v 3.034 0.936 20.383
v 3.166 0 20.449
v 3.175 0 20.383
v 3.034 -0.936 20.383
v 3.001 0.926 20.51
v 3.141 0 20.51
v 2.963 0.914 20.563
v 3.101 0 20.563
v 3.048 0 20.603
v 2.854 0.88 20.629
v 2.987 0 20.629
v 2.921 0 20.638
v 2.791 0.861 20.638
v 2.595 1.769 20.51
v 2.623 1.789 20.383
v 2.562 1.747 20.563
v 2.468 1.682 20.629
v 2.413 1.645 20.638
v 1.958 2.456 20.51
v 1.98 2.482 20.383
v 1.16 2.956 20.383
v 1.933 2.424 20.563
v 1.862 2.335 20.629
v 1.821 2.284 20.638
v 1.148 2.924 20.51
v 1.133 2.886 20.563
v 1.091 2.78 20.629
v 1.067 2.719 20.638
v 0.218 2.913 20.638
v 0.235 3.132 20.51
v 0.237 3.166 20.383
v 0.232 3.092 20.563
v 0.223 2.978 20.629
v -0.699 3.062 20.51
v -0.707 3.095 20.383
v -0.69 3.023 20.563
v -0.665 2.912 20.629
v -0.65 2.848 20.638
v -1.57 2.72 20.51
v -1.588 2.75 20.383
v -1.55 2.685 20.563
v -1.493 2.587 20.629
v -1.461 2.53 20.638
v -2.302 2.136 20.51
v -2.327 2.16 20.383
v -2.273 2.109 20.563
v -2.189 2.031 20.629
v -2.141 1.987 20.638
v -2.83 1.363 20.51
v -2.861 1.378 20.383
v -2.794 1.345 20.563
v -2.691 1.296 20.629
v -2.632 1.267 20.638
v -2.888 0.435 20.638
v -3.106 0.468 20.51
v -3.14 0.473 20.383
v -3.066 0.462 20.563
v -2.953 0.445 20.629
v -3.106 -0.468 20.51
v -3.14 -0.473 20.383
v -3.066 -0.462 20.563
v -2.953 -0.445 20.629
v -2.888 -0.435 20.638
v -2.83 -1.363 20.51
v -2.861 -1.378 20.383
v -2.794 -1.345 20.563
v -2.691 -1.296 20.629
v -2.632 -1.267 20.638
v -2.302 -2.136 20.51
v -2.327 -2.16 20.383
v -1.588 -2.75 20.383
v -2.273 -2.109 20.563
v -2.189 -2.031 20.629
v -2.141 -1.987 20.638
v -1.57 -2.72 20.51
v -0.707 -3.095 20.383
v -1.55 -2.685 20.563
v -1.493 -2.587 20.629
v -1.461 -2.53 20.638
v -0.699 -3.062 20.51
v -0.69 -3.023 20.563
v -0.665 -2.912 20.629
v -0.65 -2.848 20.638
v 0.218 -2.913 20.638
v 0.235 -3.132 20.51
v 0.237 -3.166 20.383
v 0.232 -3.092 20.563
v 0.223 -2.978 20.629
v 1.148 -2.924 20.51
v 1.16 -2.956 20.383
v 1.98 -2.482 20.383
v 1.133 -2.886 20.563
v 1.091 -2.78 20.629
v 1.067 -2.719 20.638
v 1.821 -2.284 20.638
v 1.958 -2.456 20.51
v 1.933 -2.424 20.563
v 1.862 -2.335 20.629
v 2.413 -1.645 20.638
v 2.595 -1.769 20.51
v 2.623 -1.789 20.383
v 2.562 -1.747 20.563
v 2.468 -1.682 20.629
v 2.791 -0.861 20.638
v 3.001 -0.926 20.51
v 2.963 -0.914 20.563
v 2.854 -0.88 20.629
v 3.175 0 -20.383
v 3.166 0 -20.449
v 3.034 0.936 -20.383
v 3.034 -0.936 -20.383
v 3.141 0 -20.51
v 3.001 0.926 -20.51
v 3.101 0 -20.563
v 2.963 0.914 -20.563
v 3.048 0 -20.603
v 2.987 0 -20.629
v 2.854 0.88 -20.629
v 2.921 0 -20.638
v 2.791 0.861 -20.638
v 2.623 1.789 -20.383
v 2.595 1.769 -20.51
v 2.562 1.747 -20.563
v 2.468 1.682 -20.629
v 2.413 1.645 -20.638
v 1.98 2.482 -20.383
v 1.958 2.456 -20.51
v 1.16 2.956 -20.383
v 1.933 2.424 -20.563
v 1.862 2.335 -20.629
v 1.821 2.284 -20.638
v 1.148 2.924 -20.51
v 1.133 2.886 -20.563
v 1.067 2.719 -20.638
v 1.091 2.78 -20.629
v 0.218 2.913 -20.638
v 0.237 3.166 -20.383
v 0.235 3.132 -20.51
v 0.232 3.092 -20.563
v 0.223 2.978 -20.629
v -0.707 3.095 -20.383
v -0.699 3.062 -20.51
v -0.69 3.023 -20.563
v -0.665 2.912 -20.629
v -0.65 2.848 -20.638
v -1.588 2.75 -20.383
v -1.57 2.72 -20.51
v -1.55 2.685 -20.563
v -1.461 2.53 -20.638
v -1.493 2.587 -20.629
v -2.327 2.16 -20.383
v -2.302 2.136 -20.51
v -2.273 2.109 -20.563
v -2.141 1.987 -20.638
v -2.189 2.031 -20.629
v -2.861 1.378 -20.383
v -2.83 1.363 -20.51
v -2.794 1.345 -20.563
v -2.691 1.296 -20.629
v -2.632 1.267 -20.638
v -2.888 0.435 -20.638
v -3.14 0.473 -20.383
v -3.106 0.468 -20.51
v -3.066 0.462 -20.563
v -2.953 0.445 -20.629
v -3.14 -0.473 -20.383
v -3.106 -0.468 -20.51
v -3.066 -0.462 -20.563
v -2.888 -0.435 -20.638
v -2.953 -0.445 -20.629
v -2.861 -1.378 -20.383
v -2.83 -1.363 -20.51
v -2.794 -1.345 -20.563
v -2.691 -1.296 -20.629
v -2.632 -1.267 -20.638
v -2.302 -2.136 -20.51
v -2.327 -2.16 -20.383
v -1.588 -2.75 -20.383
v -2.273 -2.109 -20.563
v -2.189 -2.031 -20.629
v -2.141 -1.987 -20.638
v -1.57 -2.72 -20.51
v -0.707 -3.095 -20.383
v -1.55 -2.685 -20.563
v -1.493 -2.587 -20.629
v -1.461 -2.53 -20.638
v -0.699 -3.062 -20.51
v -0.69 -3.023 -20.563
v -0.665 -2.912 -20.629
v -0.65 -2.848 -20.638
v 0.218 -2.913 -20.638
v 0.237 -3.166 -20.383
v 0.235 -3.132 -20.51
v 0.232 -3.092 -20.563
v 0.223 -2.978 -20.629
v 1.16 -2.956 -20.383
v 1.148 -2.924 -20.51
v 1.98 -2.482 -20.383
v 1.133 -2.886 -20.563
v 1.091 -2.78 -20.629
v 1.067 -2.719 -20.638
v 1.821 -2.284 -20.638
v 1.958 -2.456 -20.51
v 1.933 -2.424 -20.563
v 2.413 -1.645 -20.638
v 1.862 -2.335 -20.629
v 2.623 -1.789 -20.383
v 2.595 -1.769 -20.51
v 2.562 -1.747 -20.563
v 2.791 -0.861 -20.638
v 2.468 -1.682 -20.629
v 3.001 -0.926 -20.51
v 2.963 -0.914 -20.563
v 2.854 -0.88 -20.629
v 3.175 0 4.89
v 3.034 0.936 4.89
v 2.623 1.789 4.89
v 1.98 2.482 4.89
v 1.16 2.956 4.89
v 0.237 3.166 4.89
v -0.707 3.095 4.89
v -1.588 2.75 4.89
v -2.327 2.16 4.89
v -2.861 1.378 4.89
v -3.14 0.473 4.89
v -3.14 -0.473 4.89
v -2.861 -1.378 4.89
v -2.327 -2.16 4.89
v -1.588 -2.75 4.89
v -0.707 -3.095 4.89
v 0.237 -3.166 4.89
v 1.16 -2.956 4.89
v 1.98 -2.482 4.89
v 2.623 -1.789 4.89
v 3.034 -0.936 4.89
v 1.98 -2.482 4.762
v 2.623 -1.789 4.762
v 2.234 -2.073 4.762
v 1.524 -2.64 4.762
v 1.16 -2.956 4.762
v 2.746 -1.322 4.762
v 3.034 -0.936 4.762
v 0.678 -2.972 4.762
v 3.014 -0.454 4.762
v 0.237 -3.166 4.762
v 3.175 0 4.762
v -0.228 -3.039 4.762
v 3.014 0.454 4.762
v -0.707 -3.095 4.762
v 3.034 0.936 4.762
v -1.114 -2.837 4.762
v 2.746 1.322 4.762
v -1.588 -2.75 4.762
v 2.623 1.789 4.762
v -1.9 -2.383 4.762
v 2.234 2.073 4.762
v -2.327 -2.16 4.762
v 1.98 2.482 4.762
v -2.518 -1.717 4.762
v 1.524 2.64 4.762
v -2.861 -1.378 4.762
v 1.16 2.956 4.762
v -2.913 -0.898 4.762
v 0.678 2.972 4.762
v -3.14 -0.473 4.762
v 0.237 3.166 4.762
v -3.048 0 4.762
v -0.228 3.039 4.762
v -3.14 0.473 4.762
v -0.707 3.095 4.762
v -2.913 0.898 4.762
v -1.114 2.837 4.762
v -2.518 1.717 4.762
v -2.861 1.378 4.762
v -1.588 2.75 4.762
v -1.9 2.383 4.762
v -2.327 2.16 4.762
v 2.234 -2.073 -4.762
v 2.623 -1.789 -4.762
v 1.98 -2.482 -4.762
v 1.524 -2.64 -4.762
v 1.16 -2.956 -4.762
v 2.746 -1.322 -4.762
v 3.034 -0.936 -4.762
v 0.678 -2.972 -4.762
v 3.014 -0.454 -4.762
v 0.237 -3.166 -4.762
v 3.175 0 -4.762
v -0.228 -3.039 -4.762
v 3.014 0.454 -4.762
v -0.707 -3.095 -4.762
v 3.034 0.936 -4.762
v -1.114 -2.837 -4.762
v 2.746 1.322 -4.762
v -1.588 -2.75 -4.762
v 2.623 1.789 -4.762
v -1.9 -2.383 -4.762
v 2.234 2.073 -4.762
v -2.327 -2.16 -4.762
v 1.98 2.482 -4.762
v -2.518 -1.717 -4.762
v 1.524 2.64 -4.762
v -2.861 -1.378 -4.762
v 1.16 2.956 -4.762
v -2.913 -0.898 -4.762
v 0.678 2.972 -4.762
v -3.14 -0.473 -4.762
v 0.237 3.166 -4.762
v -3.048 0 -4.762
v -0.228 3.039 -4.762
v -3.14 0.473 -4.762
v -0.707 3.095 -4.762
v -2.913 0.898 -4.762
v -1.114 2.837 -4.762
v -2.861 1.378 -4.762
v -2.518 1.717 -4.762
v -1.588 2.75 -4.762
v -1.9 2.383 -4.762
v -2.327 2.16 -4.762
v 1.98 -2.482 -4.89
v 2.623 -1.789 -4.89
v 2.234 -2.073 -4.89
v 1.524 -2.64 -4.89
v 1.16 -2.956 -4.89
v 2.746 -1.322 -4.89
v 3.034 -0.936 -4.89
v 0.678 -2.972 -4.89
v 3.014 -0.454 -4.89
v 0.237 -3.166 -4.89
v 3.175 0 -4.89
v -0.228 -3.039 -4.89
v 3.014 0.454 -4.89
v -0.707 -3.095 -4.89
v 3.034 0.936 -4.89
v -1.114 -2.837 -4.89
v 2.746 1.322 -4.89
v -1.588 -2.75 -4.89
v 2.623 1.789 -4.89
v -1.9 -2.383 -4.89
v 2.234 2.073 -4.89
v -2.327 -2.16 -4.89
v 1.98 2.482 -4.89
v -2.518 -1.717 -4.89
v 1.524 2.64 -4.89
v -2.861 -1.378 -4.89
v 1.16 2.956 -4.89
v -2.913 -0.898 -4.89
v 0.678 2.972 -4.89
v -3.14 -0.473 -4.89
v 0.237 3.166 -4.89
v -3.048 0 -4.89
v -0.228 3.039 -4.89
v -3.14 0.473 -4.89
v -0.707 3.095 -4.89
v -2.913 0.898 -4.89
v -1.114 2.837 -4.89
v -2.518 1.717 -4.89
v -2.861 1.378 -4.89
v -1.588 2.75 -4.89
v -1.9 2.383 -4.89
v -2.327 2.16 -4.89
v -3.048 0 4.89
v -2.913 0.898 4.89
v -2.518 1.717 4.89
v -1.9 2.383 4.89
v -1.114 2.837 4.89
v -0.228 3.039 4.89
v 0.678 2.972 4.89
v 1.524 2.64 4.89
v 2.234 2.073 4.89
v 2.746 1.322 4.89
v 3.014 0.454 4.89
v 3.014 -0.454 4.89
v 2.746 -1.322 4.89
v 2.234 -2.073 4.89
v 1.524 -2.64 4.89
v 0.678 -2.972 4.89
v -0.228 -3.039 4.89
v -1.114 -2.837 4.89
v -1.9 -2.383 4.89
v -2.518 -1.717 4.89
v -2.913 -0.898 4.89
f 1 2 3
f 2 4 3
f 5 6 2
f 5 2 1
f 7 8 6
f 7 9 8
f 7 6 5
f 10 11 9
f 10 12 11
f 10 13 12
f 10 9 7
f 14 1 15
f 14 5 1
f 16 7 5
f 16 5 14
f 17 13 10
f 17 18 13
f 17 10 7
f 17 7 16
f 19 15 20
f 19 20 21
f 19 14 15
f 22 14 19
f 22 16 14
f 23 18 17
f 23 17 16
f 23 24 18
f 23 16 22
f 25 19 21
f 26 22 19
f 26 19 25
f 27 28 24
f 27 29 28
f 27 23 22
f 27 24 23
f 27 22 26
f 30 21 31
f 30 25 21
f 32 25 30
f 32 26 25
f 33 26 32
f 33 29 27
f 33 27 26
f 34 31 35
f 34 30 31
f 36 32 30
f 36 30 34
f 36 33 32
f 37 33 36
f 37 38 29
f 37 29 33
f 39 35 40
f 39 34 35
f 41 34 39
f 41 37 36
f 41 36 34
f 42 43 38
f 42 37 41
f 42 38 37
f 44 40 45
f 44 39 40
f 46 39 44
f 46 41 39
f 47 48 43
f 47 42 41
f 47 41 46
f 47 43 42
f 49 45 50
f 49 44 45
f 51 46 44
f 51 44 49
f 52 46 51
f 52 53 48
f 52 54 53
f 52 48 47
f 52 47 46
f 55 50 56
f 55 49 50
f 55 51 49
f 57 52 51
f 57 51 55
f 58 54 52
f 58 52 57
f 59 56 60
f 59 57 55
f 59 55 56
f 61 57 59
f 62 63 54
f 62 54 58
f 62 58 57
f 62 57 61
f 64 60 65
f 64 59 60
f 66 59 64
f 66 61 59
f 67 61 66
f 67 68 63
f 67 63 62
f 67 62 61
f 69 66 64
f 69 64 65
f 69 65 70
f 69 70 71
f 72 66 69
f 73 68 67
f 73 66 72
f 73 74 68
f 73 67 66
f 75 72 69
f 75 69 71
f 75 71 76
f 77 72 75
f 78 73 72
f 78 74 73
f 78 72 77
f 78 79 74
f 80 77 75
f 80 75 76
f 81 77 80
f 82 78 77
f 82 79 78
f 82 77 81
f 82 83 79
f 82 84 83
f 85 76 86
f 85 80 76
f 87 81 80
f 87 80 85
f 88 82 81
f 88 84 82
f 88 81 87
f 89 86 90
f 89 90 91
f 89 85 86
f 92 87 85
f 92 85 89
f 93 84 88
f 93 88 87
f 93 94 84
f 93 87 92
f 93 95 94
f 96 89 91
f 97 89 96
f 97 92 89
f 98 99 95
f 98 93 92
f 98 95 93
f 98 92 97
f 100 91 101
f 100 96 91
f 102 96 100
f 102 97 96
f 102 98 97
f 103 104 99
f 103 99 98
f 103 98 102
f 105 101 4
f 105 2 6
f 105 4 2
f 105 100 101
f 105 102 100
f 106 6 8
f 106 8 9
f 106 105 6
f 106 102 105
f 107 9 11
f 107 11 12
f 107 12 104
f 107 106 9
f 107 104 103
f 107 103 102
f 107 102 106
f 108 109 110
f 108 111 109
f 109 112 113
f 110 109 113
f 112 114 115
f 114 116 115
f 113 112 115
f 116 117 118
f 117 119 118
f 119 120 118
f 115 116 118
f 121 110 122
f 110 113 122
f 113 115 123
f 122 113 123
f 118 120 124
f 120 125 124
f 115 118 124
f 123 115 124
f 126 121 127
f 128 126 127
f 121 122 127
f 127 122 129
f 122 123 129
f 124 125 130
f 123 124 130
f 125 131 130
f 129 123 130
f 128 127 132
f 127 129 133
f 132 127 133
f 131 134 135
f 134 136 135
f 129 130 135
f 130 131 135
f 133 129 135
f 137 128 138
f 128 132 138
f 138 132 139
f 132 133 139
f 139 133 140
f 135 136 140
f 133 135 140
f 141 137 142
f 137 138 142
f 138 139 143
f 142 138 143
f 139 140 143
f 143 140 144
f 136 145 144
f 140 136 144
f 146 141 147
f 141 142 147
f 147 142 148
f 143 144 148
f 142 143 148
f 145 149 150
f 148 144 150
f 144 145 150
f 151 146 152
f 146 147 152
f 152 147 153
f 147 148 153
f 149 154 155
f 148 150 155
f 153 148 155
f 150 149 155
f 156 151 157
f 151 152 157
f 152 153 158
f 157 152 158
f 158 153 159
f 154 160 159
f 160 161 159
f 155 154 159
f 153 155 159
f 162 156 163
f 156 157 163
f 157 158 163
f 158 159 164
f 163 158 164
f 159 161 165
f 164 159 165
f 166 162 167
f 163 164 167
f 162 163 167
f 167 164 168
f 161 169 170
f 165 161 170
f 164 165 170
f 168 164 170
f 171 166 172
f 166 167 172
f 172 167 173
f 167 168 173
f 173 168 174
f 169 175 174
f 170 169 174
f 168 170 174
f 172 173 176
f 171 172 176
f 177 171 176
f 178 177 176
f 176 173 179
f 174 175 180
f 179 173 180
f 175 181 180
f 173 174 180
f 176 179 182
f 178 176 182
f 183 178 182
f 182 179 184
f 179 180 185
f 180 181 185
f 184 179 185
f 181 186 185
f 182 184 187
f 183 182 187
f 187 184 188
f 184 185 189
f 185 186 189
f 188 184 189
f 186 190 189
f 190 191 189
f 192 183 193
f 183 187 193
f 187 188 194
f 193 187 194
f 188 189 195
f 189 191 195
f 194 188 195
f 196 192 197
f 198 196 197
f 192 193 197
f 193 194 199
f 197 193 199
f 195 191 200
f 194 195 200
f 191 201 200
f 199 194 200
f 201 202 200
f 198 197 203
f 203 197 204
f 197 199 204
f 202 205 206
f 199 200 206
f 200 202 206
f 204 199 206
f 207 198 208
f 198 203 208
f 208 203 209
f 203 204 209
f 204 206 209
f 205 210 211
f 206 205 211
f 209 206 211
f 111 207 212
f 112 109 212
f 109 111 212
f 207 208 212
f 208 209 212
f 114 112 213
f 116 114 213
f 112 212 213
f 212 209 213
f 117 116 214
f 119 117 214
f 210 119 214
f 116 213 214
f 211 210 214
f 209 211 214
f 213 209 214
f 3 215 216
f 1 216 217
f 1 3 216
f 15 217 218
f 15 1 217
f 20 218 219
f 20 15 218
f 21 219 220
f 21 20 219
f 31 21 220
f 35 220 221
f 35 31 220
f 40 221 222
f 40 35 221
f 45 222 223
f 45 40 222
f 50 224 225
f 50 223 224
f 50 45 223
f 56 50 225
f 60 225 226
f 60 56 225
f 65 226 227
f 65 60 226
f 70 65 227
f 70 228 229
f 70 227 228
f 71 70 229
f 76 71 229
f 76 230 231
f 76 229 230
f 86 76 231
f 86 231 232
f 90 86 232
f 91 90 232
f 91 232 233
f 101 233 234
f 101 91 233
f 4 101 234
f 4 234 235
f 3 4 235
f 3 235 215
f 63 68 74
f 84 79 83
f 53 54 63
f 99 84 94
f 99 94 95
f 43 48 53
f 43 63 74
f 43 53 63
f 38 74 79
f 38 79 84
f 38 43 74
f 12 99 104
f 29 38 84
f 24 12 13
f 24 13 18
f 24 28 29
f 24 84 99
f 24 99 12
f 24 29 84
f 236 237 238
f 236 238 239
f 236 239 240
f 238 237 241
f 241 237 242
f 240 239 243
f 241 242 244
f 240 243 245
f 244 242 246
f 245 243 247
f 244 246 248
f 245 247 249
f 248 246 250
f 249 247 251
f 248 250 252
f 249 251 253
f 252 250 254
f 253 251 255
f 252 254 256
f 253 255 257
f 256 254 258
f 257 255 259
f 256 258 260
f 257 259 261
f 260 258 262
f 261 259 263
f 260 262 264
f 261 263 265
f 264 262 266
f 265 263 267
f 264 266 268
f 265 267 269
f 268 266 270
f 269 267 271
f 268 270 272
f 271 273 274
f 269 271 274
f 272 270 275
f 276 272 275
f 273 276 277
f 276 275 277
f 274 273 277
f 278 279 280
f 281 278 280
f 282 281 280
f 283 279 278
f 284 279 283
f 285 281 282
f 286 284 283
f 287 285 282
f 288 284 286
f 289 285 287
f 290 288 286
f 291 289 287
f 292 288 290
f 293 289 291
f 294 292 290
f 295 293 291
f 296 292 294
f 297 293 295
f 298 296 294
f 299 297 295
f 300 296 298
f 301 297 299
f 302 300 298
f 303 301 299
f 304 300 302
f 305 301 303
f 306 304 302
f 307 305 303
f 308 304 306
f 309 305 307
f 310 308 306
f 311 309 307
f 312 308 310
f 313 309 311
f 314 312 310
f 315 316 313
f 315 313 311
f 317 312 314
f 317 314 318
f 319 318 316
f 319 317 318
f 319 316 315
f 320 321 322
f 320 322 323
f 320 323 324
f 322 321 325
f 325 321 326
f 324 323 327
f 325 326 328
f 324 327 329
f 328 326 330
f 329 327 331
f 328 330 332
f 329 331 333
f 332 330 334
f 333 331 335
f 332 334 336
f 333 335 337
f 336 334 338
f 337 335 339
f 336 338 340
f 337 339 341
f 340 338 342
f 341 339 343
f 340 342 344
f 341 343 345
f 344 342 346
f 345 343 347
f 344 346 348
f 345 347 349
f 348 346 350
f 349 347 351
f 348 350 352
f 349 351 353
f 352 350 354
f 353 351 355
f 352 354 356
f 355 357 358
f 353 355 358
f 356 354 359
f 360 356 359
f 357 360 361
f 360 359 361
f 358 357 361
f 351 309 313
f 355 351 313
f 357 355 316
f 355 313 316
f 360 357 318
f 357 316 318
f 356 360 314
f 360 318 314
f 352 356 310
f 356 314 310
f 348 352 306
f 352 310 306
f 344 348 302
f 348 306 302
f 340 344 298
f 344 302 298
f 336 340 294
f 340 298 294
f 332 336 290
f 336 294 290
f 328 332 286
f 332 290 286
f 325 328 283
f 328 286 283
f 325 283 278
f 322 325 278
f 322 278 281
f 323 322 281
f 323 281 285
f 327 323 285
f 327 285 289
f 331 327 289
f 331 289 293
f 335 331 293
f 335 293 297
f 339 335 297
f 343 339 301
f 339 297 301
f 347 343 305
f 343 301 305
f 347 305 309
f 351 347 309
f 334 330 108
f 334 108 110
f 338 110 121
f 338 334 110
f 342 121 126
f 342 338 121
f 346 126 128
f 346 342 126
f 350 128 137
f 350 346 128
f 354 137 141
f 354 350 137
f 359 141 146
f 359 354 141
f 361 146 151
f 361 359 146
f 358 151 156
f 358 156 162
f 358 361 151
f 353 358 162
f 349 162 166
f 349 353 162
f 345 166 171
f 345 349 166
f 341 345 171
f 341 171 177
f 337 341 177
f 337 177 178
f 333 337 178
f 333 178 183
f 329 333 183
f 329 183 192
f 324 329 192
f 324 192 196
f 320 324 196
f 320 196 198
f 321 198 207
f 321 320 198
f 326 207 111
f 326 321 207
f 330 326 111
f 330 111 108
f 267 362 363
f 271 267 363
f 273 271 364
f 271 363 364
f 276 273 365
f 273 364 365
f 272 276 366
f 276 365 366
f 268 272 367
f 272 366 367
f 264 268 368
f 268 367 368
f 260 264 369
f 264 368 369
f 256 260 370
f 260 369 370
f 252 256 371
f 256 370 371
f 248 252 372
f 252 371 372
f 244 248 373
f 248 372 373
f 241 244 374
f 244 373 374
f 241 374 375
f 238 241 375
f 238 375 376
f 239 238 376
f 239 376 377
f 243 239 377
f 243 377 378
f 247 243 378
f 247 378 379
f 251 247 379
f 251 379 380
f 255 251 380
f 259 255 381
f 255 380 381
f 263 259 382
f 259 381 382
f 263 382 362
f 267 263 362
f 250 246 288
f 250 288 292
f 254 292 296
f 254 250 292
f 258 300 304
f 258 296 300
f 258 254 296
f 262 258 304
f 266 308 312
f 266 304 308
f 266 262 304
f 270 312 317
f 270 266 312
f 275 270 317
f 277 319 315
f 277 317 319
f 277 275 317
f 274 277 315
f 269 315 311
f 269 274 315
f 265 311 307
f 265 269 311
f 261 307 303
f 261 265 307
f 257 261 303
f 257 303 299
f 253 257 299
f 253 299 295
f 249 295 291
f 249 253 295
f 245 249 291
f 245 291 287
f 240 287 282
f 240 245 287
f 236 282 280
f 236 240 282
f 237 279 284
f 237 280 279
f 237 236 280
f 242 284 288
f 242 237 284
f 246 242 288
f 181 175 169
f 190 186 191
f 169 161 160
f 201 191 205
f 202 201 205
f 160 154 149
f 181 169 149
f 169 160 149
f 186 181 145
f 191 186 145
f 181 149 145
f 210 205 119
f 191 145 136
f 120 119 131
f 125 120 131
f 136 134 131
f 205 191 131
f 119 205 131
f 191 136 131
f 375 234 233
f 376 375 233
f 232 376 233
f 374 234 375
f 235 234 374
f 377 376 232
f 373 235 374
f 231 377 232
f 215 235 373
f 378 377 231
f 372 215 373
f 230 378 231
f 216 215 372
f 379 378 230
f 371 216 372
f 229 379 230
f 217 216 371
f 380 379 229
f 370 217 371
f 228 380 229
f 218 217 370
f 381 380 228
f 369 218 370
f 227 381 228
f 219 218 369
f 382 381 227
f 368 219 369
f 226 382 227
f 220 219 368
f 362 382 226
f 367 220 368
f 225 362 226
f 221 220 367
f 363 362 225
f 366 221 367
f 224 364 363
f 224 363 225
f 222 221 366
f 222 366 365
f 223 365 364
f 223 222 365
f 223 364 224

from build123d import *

# Parameters (mm, degrees)
SKETCH1_R           = 3.175
BOSS_EXTRUDE1_DEPTH = 20.6375
CUT_EXTRUDE1_START  = -0.127
SKETCH6_R           = 3.175
SKETCH6_R_2         = 3.048
CUT_EXTRUDE1_DEPTH  = 0.127
CUT_EXTRUDE2_START  = -0.127
SKETCH7_R           = 3.175
SKETCH7_R_2         = 3.048
CUT_EXTRUDE2_DEPTH  = 0.127
FILLET1_R           = 0.254


with BuildPart() as part:
    # Sketch1 → Boss-Extrude1 (new, symmetric)
    with BuildSketch(Plane.XY):
        Circle(SKETCH1_R)
    extrude(amount=BOSS_EXTRUDE1_DEPTH, both=True)

    # Sketch6 → Cut-Extrude1 (cut)
    with BuildSketch(Plane(origin=(0, 0, -4.8895), x_dir=(-1, 0, 0), z_dir=(0, 0, -1)).offset(CUT_EXTRUDE1_START)):
        Circle(SKETCH6_R)
        Circle(SKETCH6_R_2, mode=Mode.SUBTRACT)
    extrude(amount=CUT_EXTRUDE1_DEPTH, mode=Mode.SUBTRACT)

    # Sketch7 → Cut-Extrude2 (cut)
    with BuildSketch(Plane(origin=(0, 0, 4.7625), x_dir=(-1, 0, 0), z_dir=(0, 0, -1)).offset(CUT_EXTRUDE2_START)):
        Circle(SKETCH7_R)
        Circle(SKETCH7_R_2, mode=Mode.SUBTRACT)
    extrude(amount=CUT_EXTRUDE2_DEPTH, mode=Mode.SUBTRACT)

    # Fillet1
    fillet1_edges = [part.edges().sort_by_distance(p)[0] for p in [
        (-3.175, 0, -20.6375),
        (-3.175, 0, 20.6375),
    ]]
    fillet(fillet1_edges, radius=FILLET1_R)


solid = part.part
